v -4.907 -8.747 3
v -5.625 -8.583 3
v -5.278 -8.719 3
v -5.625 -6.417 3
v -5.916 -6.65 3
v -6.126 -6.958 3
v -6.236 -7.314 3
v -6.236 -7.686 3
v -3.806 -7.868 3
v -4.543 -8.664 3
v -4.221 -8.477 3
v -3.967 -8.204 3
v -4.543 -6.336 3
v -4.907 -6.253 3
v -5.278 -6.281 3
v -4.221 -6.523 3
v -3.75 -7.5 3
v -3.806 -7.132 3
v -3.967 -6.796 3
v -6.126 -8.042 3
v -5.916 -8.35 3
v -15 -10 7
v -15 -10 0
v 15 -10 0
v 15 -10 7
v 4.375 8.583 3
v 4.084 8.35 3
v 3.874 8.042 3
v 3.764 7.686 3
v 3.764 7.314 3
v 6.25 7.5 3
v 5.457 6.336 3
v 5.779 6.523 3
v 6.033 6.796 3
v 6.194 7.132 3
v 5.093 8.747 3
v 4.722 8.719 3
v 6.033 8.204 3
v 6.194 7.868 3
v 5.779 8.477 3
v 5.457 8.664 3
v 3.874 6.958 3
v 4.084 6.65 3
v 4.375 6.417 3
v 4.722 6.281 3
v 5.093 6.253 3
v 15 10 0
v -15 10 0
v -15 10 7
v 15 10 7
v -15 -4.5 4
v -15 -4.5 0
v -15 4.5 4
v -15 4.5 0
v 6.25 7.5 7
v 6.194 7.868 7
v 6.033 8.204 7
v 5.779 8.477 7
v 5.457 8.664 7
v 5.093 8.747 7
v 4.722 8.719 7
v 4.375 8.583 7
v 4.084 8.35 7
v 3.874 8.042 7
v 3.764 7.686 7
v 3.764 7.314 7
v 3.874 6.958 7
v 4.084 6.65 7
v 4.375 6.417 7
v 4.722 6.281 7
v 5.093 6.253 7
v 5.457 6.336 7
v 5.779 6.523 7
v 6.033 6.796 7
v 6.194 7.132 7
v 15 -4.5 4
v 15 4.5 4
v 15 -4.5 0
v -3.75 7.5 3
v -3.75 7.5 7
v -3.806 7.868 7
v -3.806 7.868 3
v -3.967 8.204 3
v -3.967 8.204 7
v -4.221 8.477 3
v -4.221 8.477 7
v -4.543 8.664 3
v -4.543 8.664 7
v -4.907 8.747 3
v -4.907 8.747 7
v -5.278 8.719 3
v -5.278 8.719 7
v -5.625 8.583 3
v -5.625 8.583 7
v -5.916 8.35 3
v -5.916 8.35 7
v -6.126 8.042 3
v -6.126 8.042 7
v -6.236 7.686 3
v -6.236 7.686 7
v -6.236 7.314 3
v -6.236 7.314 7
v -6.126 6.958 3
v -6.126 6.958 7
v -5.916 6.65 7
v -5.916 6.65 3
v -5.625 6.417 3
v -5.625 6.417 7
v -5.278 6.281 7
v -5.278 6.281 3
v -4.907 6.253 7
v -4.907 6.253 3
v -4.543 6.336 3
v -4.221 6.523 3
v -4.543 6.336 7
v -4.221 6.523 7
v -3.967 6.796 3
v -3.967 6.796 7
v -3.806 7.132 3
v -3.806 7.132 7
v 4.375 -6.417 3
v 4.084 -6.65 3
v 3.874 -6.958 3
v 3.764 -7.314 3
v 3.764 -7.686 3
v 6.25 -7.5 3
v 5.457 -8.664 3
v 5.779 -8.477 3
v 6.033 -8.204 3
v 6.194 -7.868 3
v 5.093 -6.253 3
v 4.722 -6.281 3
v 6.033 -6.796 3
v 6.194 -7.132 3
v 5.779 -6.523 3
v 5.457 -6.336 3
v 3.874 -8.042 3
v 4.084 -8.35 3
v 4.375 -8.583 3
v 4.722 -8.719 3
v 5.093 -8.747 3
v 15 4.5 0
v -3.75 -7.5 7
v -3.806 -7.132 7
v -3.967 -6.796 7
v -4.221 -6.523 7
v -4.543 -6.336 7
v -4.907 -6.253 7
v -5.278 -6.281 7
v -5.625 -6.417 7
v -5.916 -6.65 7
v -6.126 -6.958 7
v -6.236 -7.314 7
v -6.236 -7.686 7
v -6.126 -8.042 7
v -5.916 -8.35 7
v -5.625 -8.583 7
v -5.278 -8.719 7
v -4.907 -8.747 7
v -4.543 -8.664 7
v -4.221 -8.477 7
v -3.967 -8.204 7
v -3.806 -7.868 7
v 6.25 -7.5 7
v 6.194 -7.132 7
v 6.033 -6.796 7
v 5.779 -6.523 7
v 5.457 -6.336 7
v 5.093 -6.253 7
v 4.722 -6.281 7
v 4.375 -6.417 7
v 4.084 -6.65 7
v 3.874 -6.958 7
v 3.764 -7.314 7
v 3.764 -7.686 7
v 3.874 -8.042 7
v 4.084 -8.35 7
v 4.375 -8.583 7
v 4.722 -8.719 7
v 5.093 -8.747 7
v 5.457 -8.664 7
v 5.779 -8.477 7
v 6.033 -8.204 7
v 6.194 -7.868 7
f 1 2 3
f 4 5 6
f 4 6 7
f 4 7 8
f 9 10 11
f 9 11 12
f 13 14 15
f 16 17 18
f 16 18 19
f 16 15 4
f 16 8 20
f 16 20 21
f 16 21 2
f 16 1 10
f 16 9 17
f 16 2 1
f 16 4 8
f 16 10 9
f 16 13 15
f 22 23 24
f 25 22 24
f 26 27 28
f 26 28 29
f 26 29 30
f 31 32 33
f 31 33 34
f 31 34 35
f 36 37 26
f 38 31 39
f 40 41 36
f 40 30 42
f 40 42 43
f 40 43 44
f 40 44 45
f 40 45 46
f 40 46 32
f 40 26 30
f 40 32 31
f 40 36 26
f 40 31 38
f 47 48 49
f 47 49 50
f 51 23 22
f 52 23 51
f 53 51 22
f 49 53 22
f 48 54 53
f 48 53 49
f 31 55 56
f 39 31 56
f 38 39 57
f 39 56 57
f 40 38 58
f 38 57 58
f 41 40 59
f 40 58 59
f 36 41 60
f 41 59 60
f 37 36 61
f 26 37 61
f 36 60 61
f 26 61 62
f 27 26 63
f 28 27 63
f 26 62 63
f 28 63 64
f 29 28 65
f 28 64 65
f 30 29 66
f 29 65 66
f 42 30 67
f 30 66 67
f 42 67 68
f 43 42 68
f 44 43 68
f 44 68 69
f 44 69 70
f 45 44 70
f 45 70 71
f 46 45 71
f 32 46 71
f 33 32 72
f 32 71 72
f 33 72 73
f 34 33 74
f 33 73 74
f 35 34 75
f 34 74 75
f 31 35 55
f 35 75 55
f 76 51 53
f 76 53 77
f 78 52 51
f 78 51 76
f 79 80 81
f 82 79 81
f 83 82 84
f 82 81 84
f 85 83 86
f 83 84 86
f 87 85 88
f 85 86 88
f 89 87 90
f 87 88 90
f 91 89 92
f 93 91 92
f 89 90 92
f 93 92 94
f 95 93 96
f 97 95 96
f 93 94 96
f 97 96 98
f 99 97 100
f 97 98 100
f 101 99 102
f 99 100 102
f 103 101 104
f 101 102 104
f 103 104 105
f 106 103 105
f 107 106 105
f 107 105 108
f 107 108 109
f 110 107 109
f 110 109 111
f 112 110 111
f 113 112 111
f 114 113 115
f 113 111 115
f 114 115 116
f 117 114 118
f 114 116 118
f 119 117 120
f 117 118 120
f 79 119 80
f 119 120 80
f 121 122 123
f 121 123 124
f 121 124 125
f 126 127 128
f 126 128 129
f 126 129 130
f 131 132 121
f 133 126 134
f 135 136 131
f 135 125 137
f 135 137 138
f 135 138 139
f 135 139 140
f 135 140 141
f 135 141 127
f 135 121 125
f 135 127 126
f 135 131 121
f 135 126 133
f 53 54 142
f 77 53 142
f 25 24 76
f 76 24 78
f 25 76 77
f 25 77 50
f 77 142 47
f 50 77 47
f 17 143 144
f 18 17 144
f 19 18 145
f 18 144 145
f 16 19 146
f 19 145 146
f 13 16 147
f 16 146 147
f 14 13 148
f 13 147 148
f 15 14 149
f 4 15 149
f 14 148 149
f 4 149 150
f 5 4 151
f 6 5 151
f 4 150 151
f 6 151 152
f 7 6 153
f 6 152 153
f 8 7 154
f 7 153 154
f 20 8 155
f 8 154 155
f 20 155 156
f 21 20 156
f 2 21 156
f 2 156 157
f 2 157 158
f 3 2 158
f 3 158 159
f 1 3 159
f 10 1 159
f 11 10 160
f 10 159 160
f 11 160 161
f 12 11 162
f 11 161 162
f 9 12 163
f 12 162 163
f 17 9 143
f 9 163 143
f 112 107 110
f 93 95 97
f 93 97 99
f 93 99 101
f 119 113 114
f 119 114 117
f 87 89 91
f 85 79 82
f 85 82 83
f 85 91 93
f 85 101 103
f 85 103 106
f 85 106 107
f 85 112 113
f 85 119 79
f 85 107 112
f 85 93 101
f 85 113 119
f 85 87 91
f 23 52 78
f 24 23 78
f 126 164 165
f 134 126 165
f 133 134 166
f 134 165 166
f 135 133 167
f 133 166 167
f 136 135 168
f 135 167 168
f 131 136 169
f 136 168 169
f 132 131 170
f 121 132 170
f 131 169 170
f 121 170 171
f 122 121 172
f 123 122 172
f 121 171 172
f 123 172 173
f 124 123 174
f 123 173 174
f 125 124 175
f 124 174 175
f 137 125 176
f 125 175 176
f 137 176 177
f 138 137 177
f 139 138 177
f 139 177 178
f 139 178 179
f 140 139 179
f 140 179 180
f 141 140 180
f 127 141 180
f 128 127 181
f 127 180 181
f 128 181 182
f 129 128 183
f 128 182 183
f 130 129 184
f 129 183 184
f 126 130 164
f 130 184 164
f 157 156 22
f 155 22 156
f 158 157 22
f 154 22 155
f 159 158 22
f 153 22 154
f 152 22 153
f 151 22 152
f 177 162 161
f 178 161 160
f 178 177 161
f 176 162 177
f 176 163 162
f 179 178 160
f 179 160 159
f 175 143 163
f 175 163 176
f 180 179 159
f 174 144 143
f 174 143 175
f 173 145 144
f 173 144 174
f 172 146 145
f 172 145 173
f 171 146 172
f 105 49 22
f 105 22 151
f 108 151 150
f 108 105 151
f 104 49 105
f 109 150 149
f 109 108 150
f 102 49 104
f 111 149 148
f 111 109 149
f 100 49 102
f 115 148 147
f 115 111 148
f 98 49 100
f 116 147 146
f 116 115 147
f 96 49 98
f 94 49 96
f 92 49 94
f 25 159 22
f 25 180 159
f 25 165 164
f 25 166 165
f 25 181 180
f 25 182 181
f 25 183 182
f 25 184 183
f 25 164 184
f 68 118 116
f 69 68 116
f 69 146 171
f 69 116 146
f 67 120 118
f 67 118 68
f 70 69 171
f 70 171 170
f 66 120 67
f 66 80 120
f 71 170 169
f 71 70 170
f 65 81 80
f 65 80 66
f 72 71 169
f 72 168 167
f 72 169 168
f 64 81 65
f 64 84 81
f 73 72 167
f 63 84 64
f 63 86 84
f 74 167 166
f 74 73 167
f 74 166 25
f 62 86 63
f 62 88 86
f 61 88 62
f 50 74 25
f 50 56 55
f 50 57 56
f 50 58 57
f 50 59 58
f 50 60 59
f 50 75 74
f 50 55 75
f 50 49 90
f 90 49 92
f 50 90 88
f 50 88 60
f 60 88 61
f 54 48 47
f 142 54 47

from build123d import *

# Parameters (mm, degrees)
F0_W     = 30
F0_H     = 20
F1_DEPTH = 7
F2_R     = 1.25
F3_DEPTH = 4
F4_W     = 30
F4_H     = 9
F5_DEPTH = 4


with BuildPart() as f1:
    # F0 (on Top) → F1 (new body)
    with BuildSketch(Plane.XY):
        Rectangle(F0_W, F0_H)
    extrude(amount=F1_DEPTH)

    # F2 (on face) → F3 (cut)
    with BuildSketch(Plane.XY.offset(7)):
        with Locations((5, 7.5)):
            Circle(F2_R)
        with Locations((-5, 7.5)):
            Circle(F2_R)
        with Locations((-5, -7.5)):
            Circle(F2_R)
        with Locations((5, -7.5)):
            Circle(F2_R)
    extrude(amount=-F3_DEPTH, mode=Mode.SUBTRACT)

    # F4 (on face) → F5 (cut)
    with BuildSketch(Plane(origin=(0, 0, 0), x_dir=(1, 0, 0), z_dir=(0, 0, -1))):
        Rectangle(F4_W, F4_H)
    extrude(amount=-F5_DEPTH, mode=Mode.SUBTRACT)


solid = f1.part
